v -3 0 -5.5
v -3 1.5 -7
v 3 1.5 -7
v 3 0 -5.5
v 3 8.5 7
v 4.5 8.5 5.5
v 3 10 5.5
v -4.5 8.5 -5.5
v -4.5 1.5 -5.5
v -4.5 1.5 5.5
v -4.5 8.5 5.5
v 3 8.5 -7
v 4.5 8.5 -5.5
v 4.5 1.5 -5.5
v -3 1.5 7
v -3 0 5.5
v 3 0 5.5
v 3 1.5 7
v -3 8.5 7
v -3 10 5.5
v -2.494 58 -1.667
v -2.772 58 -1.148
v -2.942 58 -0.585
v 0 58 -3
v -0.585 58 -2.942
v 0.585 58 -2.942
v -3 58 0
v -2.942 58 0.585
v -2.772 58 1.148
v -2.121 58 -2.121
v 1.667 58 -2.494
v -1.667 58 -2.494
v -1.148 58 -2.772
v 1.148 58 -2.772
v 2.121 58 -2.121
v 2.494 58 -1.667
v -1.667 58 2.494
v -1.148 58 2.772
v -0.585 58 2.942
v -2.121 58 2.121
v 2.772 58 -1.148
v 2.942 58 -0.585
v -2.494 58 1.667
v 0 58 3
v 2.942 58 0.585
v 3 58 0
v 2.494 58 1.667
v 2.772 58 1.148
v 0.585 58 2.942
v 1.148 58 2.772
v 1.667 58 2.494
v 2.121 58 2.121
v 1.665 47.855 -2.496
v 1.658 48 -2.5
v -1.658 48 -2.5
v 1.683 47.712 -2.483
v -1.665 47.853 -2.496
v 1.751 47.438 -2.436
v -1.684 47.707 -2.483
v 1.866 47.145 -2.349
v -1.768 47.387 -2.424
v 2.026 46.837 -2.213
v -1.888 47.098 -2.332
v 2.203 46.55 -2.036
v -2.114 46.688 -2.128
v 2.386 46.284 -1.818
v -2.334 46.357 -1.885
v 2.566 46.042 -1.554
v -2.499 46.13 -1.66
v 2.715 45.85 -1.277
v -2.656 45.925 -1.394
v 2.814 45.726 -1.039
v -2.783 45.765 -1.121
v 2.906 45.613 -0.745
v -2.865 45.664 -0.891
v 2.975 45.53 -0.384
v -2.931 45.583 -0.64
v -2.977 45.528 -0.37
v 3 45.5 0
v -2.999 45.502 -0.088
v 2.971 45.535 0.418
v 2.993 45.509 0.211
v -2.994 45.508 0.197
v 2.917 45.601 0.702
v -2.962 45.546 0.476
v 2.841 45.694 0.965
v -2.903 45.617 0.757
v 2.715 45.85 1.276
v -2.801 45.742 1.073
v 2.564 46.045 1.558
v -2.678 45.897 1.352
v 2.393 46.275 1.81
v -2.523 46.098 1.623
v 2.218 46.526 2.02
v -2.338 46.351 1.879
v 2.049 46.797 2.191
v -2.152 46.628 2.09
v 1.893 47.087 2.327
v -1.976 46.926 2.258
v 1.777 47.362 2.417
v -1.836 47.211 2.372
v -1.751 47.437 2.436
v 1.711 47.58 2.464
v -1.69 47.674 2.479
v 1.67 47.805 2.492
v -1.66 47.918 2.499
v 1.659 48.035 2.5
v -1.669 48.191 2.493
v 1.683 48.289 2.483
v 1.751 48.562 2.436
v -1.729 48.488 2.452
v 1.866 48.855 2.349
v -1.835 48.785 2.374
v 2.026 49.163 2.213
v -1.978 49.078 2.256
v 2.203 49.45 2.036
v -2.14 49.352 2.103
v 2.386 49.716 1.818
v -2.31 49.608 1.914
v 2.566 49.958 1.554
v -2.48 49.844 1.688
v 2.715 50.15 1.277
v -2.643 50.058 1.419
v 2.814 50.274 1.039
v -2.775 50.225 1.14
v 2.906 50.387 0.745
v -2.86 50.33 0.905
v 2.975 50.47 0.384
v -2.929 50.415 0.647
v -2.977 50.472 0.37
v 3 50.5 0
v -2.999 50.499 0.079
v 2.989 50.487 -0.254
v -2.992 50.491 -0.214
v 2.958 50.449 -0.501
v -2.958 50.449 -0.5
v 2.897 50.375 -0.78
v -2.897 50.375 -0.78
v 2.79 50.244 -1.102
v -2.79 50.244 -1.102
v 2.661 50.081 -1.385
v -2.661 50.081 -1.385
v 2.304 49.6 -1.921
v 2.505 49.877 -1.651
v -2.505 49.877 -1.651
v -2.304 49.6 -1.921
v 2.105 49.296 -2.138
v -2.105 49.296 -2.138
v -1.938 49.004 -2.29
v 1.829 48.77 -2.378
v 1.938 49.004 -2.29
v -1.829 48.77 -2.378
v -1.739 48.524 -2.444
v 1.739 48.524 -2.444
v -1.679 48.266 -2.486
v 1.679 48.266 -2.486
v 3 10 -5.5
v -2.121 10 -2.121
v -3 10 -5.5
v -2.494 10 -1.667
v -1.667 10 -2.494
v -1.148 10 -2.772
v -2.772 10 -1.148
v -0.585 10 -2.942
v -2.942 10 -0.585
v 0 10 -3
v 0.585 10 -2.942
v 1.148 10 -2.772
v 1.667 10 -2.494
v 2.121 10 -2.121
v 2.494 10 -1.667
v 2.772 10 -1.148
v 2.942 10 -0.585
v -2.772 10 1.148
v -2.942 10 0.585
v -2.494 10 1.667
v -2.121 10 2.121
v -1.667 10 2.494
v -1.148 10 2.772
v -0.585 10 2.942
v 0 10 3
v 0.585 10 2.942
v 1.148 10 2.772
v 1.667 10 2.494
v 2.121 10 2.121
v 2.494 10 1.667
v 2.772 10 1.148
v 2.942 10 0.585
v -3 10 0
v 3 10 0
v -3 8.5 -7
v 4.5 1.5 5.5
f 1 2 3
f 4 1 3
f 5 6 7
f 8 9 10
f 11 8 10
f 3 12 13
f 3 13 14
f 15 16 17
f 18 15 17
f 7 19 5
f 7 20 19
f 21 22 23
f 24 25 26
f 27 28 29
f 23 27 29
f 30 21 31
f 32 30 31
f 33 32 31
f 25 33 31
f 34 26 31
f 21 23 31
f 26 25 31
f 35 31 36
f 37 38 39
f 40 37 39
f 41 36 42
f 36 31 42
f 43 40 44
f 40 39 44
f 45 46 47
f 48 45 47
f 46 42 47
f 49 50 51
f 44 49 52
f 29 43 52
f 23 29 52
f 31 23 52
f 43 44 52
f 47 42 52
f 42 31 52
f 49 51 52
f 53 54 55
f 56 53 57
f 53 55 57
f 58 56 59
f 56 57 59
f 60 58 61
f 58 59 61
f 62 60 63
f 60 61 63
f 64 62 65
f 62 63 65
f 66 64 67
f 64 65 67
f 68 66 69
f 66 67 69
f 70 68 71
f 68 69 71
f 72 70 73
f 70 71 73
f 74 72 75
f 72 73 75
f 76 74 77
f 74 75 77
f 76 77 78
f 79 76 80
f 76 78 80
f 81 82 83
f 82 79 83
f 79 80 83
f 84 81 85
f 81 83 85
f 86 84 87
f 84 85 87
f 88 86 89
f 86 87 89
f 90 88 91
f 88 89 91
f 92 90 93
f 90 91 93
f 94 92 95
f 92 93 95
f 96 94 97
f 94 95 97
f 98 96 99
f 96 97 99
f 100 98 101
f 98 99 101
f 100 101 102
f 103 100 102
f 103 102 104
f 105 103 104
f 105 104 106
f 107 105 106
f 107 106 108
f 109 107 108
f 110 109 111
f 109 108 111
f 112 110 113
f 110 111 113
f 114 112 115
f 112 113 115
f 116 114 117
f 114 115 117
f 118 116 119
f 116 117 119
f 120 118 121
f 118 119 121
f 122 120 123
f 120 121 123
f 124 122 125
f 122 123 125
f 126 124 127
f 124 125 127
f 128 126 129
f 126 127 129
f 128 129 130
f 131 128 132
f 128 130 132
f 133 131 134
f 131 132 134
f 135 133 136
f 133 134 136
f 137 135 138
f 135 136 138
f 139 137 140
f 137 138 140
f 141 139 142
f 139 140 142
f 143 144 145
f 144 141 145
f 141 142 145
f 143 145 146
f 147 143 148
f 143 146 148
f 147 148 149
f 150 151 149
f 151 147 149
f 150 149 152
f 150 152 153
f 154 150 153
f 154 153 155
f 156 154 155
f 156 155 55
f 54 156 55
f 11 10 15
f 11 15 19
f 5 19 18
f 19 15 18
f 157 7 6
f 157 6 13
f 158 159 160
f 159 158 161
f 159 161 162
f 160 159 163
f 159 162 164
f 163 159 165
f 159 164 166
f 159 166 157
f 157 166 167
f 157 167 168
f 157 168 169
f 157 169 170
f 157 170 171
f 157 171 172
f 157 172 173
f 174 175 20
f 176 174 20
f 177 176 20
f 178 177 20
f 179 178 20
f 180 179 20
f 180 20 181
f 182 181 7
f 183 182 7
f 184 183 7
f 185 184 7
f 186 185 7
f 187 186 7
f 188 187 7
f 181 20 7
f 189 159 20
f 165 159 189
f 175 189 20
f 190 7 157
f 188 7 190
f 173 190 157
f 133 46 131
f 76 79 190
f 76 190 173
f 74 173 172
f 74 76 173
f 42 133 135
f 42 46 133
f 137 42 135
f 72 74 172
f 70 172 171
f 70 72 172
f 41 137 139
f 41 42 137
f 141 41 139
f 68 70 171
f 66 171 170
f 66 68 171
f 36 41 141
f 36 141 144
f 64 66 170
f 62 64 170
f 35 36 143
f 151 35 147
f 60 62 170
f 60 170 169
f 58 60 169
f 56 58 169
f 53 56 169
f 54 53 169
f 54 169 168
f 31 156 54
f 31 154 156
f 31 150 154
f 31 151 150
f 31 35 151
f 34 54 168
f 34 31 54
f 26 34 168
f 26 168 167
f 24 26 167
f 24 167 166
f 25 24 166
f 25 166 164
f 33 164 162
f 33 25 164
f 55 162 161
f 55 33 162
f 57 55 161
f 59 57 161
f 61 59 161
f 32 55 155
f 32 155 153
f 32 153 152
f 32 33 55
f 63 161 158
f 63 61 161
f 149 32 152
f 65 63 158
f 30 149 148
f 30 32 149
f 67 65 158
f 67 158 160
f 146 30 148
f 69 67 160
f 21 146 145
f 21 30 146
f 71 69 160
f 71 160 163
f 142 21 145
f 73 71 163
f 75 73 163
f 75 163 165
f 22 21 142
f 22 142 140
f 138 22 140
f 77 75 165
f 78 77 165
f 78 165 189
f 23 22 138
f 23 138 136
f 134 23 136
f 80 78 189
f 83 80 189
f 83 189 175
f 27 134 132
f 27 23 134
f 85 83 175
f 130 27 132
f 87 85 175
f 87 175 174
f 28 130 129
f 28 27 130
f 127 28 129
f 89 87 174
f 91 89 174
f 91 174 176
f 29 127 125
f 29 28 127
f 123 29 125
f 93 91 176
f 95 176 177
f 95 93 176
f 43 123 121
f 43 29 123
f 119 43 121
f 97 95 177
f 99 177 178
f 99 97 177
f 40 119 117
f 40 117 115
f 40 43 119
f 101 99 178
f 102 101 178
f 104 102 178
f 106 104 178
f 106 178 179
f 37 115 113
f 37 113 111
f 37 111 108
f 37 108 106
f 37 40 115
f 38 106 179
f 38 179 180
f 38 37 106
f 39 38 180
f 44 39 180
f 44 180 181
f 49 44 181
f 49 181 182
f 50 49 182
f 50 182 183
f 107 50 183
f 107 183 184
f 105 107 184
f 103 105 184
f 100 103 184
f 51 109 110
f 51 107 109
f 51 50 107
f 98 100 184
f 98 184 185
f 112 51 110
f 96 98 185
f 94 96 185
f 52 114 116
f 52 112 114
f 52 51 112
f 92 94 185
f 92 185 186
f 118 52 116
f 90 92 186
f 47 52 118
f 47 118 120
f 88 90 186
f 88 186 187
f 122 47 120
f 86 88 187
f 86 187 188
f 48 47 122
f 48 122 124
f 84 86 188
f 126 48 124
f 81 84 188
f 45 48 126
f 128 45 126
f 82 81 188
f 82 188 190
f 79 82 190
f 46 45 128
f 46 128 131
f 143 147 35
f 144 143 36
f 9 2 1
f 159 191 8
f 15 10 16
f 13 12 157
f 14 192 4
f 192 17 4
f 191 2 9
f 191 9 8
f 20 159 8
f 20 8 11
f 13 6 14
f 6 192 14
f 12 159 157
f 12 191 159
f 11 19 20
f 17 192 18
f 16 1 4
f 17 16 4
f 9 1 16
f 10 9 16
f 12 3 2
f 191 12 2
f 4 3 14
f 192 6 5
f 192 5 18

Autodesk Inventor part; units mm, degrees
ref_plane "YZ Plane" through (0, 0, 0) normal (1, 0, 0) x (0, 1, 0)
ref_plane "XZ Plane" through (0, 0, 0) normal (0, 1, 0) x (-1, 0, 0)
sketch "草圖1" plane through (0, 0, 0) normal (0, 0, 1) x (1, 0, 0)
  line L0 (0, 0) -> (3, 0)
  line L1 (3, 0) -> (3, 58)
  line L2 (3, 58) -> (0, 58)
  line L3 (0, 58) -> (0, 0)
  dimension "d0" = 58
  dimension "d1" = 3
revolve "迴轉1" add sketch "草圖1" angle 360 about axis through (0, 58, 0) along (0, -1, 0)
ref_plane "工作平面1" through (0, 48, 0) normal (0, 1, 0) x (1, 0, 0)
sketch "草圖2" plane through (0, 48, 0) normal (0, 1, 0) x (1, 0, 0)
  line L0 (-10.3022, 0) -> (10.735, 0)
  line L1 (10.735, 0) -> (10.735, 2.5)
  line L2 (10.735, 2.5) -> (-10.3022, 2.5)
  line L3 (-10.3022, 2.5) -> (-10.3022, 0)
  point P0 (0, 0)
  dimension "d4" = 2.5
  dimension "d5" = 0
revolve "迴轉2" cut sketch "草圖2" angle 360 about axis through (-10.3022, 48, 0) along (1, 0, 0)
sketch "草圖3" plane through (0, 0, 0) normal (0, -1, 0) x (1, 0, 0)
  line L0 (-4.5, 7) -> (4.5, 7)
  line L1 (4.5, 7) -> (4.5, -7)
  line L2 (4.5, -7) -> (-4.5, -7)
  line L3 (-4.5, -7) -> (-4.5, 7)
  point P0 (0, 0)
  dimension "d7" = 9
  dimension "d8" = 4.5
  dimension "d9" = 14
  dimension "d10" = 7
extrude "擠出1" add sketch "草圖3" against normal blind 10
chamfer "倒角1" distance 1.5 angle 45 12 edges at (4.5, 5, -7) (4.5, 5, 7) (-4.5, 5, 7) (-4.5, 5, -7) (0, 0, -7) (-4.5, 0, 0) (4.5, 0, 0) (0, 0, 7) (0, 10, -7) (4.5, 10, 0) (0, 10, 7) (-4.5, 10, 0)
properties part number "槌子"
